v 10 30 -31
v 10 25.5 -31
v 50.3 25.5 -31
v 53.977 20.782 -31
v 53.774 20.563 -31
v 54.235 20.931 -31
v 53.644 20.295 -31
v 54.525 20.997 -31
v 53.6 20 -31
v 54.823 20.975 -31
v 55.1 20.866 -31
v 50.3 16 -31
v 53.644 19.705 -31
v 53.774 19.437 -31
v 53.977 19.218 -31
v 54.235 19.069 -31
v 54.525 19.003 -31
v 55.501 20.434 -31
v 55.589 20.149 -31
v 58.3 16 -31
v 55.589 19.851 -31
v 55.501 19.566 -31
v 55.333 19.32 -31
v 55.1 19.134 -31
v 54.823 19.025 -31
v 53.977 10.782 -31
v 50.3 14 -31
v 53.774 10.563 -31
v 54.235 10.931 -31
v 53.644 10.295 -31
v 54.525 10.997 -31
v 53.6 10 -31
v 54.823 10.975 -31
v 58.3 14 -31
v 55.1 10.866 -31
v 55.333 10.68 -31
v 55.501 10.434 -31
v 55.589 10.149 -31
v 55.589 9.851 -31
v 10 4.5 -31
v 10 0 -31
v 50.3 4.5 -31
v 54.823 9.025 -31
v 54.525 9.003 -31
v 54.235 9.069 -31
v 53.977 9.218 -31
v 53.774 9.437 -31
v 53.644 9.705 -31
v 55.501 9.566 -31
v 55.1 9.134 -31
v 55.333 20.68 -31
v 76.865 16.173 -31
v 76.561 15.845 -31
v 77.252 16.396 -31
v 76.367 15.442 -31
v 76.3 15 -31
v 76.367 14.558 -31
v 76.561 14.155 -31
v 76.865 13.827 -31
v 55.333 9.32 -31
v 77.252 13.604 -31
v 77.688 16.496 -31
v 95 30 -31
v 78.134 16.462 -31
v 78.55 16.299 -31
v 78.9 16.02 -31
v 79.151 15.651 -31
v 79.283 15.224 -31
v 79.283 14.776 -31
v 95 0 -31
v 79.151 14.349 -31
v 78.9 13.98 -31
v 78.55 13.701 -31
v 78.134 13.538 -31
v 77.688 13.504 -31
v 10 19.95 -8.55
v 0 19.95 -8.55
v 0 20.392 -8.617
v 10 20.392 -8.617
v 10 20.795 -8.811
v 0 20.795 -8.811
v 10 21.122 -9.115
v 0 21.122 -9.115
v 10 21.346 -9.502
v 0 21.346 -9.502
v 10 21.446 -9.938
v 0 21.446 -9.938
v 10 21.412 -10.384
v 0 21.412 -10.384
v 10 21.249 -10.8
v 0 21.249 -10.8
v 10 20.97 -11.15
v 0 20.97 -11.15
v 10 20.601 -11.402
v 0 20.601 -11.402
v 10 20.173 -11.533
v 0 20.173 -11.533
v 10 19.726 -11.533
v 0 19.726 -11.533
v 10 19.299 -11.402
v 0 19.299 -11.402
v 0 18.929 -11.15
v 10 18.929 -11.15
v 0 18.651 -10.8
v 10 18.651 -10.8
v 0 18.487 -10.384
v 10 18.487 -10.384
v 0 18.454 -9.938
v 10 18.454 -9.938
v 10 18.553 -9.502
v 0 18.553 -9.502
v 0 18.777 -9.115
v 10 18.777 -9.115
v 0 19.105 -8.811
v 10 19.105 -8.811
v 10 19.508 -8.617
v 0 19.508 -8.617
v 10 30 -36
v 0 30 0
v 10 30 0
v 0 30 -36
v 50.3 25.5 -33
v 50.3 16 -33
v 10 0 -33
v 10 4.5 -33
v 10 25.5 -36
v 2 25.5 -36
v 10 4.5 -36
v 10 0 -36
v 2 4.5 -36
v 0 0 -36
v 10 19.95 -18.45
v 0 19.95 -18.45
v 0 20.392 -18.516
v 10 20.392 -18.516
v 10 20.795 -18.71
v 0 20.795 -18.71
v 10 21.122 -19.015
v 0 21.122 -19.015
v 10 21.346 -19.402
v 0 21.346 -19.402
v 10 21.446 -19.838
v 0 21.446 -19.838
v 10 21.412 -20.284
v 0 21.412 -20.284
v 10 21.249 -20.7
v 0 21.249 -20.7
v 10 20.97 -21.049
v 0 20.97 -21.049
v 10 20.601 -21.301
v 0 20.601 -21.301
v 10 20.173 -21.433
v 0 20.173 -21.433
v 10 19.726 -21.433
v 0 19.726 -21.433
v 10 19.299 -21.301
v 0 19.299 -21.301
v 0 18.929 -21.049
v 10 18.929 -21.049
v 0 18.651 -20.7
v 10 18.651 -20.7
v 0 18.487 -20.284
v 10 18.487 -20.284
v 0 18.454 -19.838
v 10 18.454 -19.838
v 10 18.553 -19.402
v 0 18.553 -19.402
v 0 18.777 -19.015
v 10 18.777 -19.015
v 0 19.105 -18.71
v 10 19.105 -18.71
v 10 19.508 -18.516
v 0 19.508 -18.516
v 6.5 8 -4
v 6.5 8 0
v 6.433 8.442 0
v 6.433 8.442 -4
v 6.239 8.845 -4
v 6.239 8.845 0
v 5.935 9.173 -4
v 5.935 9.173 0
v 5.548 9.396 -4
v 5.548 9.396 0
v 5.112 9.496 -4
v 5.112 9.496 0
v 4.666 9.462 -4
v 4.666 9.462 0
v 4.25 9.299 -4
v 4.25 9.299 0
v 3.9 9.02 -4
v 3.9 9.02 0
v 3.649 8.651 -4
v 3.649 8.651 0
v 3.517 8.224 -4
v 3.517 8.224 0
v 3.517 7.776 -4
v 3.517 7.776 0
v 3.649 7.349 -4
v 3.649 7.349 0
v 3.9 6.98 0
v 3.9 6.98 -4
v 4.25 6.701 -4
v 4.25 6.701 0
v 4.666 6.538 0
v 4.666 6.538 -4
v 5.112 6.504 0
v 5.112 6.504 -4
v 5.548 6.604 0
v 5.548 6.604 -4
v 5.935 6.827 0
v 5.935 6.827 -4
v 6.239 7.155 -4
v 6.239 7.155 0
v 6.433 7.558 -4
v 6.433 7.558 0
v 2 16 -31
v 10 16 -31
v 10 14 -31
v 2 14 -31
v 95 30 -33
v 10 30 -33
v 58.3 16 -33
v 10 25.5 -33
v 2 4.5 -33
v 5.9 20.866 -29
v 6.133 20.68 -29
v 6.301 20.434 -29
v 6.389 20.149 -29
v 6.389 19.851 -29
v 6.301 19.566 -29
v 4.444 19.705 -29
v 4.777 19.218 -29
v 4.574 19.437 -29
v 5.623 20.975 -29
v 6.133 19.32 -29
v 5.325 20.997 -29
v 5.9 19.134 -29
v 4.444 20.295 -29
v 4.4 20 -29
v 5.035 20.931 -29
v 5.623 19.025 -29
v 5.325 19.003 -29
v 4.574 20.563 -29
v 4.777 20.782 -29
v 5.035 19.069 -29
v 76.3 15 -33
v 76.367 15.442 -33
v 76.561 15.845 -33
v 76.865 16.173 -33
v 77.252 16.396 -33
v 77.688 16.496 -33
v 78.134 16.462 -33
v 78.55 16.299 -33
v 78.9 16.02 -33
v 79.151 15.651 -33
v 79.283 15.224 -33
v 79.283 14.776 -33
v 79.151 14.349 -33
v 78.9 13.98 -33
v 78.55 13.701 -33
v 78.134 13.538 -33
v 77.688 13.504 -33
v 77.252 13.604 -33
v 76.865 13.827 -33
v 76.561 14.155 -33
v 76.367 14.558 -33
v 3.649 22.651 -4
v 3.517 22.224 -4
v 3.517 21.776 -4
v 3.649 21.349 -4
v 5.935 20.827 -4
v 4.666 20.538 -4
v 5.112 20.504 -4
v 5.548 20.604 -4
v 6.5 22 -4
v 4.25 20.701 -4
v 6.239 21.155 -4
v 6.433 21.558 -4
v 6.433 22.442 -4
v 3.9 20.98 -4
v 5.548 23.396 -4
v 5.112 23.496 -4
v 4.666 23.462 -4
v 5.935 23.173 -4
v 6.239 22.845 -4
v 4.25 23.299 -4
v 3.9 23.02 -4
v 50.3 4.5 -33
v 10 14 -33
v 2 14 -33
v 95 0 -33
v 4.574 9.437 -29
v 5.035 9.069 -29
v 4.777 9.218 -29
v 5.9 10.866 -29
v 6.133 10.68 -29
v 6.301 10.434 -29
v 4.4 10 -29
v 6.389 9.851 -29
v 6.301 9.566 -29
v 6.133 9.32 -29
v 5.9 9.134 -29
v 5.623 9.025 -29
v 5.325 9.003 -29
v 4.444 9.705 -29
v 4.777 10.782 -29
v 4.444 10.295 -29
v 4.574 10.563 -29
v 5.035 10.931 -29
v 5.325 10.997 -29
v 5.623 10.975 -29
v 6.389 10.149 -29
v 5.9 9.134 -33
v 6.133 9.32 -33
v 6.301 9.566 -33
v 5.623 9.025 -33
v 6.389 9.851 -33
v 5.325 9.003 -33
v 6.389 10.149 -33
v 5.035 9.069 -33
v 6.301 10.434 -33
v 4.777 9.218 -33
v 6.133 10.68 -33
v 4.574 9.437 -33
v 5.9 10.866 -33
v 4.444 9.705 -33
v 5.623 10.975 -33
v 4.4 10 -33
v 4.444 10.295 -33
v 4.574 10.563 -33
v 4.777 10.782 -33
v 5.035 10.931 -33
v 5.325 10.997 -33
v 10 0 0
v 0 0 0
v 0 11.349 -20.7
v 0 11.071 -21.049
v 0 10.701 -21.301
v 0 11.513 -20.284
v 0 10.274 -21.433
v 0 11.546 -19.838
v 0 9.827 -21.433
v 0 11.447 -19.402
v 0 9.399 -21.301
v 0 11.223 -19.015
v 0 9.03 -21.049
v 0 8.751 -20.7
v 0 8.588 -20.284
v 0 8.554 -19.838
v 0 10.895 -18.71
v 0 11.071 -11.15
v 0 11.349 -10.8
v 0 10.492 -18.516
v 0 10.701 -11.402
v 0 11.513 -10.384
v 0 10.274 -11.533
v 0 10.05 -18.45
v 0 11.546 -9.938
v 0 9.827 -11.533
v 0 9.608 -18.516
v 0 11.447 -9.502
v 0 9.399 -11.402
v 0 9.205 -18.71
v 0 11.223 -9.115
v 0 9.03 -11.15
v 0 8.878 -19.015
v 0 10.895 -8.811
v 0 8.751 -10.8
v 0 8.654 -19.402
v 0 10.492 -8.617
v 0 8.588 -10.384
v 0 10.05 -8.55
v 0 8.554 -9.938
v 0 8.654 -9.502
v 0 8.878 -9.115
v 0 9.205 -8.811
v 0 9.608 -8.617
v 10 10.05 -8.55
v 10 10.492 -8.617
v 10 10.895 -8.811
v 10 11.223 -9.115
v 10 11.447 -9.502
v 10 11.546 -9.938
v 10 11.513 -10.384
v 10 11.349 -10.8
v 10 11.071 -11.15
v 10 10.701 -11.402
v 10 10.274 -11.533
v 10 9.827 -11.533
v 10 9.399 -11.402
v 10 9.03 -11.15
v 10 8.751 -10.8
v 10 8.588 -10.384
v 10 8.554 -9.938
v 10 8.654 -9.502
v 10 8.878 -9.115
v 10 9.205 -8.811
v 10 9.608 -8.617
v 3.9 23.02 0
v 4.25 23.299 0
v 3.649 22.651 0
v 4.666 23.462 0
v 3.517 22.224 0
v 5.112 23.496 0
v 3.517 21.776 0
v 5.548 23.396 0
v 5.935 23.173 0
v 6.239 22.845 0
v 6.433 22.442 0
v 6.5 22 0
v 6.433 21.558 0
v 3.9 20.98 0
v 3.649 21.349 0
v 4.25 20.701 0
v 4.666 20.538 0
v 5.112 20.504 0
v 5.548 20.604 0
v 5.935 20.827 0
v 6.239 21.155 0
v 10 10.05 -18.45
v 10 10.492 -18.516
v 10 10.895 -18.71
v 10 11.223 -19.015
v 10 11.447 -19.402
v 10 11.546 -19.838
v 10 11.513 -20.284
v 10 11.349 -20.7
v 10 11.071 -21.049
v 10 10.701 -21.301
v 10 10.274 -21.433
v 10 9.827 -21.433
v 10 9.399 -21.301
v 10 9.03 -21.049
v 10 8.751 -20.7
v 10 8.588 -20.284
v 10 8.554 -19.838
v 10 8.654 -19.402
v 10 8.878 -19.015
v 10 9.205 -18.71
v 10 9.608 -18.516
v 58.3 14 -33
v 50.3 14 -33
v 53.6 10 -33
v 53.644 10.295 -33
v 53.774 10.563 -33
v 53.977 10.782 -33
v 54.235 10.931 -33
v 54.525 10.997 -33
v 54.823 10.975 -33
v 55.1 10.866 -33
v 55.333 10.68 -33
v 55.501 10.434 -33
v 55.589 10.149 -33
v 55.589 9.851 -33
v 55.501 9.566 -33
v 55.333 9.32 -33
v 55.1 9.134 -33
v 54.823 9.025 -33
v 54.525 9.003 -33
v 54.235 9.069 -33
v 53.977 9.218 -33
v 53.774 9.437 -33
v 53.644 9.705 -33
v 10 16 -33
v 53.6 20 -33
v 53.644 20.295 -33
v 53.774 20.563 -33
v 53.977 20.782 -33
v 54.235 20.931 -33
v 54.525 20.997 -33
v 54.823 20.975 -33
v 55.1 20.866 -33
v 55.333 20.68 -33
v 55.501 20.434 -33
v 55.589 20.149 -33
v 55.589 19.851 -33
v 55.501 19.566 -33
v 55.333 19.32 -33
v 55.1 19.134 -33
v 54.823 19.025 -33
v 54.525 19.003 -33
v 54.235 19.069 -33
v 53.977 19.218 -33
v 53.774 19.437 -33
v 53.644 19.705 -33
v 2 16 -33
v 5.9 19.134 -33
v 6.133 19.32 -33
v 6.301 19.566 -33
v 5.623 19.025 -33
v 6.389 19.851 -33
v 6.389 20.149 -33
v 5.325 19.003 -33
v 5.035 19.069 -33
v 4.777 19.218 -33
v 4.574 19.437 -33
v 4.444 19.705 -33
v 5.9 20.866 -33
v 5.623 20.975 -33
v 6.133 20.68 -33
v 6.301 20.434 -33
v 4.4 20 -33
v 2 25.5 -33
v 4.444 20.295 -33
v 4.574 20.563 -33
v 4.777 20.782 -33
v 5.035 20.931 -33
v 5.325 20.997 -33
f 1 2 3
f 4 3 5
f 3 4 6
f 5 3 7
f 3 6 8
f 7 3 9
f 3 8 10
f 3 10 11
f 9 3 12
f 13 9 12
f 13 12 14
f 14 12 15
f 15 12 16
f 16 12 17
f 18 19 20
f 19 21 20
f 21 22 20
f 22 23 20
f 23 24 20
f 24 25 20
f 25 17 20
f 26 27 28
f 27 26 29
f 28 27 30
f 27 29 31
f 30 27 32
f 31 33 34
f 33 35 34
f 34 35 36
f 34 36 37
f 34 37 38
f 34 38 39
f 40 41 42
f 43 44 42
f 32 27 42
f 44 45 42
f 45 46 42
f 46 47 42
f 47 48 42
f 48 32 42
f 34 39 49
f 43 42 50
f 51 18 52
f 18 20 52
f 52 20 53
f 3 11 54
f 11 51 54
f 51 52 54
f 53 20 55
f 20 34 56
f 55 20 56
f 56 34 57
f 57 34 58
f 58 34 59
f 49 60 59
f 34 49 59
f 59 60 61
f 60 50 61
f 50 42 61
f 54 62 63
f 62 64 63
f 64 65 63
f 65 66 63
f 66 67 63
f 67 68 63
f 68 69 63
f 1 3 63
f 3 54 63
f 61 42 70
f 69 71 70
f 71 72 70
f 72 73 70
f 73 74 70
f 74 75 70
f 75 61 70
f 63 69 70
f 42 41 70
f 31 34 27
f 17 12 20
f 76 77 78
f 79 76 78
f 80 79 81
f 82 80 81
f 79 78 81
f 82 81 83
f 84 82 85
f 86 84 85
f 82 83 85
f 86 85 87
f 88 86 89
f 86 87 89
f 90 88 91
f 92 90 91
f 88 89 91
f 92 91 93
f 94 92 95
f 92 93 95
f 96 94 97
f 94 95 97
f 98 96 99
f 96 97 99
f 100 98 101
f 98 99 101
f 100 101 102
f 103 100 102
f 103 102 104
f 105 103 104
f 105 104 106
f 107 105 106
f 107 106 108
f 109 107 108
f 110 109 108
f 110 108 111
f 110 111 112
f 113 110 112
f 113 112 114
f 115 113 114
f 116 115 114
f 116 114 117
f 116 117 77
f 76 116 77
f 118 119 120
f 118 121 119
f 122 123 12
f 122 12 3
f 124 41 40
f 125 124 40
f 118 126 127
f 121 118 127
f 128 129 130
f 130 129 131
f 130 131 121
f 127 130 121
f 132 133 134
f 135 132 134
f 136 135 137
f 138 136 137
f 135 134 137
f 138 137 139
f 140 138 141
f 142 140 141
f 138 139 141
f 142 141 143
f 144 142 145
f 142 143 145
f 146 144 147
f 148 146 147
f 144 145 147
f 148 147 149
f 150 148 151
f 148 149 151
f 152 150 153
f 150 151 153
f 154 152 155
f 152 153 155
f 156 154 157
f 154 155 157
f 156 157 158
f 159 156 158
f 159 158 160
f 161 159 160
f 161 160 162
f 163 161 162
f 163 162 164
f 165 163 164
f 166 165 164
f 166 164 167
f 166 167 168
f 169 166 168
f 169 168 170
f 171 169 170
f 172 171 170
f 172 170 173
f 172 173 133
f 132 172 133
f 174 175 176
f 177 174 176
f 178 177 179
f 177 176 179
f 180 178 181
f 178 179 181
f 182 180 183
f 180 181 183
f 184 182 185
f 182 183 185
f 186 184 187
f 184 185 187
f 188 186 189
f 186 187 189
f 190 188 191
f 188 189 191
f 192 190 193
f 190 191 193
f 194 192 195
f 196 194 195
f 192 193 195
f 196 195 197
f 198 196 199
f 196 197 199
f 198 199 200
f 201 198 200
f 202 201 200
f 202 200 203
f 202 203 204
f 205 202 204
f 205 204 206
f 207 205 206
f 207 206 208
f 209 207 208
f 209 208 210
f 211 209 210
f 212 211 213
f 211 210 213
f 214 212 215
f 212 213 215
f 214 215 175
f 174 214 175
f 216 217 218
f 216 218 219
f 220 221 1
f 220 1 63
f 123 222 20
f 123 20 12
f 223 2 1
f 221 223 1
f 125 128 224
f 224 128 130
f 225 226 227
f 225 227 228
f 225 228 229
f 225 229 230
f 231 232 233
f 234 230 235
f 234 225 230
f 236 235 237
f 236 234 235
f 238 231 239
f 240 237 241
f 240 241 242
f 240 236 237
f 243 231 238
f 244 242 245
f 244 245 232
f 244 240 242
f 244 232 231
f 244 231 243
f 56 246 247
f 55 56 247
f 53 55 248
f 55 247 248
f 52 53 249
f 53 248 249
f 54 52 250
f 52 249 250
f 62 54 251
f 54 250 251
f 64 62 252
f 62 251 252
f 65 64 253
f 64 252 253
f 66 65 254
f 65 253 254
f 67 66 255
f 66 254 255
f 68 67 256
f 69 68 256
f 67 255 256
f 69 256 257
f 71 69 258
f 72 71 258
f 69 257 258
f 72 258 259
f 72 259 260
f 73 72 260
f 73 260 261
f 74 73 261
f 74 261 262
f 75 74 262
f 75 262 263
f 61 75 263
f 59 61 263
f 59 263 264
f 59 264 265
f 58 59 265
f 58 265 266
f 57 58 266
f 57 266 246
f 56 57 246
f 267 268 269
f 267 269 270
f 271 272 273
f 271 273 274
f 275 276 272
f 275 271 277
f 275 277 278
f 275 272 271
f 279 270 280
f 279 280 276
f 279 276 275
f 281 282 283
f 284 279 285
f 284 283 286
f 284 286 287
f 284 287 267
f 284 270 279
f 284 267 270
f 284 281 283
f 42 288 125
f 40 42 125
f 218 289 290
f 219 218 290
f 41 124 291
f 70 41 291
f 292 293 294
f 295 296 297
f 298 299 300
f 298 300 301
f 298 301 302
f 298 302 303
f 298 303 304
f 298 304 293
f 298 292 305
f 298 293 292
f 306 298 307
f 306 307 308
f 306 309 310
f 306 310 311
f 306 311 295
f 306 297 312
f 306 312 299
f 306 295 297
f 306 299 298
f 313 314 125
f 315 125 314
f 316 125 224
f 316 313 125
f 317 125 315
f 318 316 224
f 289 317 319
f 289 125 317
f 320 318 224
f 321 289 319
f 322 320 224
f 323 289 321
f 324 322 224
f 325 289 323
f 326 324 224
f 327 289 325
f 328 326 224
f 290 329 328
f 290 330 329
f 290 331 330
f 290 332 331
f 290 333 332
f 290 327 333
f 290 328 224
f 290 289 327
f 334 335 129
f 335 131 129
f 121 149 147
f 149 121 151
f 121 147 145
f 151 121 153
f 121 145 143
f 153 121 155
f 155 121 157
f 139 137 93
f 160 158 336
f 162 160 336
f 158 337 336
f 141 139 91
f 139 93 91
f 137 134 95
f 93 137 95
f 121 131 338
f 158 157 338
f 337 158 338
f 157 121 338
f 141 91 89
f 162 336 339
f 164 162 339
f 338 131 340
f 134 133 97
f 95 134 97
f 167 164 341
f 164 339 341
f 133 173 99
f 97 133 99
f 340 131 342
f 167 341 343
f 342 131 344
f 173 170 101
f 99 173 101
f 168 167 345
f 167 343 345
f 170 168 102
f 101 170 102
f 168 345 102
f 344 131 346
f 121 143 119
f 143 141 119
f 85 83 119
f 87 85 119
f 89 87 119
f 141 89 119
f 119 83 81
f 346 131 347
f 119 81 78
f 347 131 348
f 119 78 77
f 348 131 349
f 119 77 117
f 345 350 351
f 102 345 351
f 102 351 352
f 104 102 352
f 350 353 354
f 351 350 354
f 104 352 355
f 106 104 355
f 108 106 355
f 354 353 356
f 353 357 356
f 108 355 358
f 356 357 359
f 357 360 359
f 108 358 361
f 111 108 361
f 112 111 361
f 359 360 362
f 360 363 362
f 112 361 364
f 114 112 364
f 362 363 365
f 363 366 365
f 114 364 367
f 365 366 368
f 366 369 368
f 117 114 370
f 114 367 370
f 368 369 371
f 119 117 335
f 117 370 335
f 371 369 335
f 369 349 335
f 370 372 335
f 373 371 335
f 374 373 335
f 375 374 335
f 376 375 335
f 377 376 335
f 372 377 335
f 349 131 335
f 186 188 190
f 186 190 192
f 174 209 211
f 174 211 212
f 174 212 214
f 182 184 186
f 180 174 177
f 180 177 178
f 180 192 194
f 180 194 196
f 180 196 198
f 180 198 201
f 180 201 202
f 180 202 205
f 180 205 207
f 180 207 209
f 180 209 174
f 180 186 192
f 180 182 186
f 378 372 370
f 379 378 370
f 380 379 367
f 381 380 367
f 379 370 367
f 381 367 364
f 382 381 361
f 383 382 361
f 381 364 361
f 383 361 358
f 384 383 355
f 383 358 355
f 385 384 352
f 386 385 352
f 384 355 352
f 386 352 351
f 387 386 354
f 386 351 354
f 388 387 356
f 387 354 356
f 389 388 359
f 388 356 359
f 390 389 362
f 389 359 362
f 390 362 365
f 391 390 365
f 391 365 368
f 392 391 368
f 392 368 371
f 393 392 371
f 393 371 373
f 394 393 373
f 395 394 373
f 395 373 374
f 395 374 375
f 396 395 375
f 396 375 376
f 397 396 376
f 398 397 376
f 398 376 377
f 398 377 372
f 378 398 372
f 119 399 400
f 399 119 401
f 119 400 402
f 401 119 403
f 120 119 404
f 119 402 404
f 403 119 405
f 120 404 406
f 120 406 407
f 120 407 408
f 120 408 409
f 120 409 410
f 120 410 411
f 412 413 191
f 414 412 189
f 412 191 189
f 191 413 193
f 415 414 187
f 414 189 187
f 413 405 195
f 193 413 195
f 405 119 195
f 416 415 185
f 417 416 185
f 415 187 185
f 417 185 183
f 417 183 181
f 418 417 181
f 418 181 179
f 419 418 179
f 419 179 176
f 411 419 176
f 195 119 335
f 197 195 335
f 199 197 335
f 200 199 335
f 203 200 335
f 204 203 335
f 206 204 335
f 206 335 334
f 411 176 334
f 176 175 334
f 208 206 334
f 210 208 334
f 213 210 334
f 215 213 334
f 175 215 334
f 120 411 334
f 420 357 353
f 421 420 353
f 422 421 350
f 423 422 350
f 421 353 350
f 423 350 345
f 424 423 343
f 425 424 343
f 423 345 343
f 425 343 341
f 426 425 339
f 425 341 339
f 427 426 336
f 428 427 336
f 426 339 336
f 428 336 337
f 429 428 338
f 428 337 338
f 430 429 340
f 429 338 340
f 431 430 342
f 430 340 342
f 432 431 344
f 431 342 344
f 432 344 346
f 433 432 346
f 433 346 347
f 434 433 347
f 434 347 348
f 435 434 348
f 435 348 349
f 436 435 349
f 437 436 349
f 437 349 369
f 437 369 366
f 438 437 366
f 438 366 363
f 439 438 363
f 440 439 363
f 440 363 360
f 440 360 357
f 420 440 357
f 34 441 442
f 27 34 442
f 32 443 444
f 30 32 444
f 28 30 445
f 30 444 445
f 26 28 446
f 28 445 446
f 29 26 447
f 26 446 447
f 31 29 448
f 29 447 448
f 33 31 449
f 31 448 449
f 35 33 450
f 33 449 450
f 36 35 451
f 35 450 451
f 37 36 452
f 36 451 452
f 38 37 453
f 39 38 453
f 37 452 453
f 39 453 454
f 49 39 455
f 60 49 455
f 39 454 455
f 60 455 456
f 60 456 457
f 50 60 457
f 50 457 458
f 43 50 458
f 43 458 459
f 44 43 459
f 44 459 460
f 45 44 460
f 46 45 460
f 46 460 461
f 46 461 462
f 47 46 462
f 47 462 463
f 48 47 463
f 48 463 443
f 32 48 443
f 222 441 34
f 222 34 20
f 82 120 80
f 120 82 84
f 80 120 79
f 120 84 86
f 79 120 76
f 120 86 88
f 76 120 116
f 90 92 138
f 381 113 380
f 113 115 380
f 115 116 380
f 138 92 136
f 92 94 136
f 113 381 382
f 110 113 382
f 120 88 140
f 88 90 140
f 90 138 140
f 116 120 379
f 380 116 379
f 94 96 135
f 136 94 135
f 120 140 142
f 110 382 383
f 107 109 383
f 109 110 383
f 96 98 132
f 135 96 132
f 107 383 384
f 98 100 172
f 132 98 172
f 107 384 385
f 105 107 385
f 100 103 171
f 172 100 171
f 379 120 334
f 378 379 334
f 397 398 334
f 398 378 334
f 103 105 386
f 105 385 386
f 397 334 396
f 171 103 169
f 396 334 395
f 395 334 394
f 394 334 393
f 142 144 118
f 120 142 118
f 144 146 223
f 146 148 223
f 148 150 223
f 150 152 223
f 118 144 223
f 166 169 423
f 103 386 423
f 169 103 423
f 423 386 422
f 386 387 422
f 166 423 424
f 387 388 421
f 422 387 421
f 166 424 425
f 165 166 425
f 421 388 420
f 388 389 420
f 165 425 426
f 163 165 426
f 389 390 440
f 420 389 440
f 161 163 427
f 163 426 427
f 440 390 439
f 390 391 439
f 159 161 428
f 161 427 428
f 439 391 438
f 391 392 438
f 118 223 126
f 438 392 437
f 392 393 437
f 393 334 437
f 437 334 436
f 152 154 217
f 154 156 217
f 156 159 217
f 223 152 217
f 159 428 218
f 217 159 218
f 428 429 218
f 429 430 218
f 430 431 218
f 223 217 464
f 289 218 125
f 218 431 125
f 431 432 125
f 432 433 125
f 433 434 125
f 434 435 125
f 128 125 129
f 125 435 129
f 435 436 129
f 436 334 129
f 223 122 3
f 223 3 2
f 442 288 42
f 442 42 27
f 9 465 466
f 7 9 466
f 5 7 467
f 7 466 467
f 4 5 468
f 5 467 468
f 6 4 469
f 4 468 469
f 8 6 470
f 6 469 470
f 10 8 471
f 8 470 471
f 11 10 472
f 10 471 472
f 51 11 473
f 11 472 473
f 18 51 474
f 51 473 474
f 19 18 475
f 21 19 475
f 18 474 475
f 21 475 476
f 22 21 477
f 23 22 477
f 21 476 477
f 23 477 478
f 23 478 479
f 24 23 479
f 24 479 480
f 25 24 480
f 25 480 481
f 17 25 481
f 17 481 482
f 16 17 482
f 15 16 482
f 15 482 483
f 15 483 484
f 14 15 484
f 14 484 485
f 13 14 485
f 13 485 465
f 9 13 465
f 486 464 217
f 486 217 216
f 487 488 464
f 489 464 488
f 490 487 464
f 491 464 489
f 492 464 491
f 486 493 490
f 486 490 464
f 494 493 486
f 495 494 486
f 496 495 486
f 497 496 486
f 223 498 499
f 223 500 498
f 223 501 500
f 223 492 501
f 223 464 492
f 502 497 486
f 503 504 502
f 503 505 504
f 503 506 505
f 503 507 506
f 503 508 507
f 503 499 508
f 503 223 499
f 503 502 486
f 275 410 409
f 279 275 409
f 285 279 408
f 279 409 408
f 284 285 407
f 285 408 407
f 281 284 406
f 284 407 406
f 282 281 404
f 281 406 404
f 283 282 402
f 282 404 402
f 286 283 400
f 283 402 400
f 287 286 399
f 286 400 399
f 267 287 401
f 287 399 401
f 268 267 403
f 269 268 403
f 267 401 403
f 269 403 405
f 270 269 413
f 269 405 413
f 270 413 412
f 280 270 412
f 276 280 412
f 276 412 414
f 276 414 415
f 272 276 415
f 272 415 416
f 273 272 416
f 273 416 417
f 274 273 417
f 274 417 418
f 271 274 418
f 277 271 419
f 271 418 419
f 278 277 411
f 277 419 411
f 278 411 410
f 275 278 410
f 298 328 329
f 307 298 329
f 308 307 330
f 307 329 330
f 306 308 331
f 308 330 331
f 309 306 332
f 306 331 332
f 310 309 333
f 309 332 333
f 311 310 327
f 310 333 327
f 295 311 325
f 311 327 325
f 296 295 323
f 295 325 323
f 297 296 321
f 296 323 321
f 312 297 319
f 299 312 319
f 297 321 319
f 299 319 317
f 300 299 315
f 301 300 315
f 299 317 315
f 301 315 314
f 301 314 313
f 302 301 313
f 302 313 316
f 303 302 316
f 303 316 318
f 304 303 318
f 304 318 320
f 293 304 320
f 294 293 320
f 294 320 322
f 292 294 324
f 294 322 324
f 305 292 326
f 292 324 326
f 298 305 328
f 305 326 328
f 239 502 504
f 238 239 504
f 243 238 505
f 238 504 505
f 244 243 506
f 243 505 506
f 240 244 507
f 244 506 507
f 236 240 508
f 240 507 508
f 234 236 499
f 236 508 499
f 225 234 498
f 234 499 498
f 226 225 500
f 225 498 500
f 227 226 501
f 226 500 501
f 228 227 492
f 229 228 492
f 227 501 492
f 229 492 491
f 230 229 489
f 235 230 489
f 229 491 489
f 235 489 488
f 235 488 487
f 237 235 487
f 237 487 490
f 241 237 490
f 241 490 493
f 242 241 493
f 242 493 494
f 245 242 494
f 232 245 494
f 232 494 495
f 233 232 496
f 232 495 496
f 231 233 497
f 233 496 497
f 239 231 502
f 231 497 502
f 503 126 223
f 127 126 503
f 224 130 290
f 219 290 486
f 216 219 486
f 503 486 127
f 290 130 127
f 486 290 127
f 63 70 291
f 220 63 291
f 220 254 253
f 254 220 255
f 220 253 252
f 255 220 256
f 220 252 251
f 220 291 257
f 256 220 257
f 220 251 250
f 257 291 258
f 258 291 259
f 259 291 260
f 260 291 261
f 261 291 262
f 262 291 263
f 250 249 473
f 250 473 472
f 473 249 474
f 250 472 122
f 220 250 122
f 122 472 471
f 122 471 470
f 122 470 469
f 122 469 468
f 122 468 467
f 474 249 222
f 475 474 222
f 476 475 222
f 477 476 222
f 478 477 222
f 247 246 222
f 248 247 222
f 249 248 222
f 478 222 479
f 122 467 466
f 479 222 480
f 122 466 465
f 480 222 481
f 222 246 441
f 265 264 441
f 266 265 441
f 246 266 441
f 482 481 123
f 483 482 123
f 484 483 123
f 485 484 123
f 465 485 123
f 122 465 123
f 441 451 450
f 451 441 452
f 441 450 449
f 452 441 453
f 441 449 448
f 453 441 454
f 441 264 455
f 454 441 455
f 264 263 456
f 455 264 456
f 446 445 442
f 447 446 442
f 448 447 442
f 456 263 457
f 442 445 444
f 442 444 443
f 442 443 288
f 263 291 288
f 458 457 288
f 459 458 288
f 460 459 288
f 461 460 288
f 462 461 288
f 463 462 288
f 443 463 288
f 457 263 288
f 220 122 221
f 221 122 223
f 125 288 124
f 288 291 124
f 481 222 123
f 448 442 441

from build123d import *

# Parameters (mm, degrees)
EXTRUDE_1_DEPTH     = 30
SKETCH_2_R          = 1.5
CUT_EXTRUDE_1_DEPTH = 106.929221653
SKETCH_3_W          = 40.3
SKETCH_3_H          = 21
CUT_EXTRUDE_2_DEPTH = 106.929221653
SKETCH_4_W          = 8
SKETCH_4_H          = 21
CUT_EXTRUDE_3_DEPTH = 3
SKETCH_5_W          = 56.3
SKETCH_5_H          = 2
CUT_EXTRUDE_4_DEPTH = 5
SKETCH_6_R          = 1
CUT_EXTRUDE_5_DEPTH = 4
SKETCH_7_R          = 1.5
CUT_EXTRUDE_6_DEPTH = 106.929221653
SKETCH_8_R          = 1.5
CUT_EXTRUDE_7_DEPTH = 4


with BuildPart() as part:
    # Эскиз1 → Бобышка-Вытянуть1 (new body)
    with BuildSketch(Plane(origin=(0, 0, 0), x_dir=(1, 0, 0), z_dir=(0, 1, 0))):
        Polygon((0, 0), (10, 0), (10, 31), (95, 31), (95, 33), (10, 33), (10, 36), (0, 36), align=None)
    extrude(amount=EXTRUDE_1_DEPTH)

    # Эскиз2 → Вырез-Вытянуть1 (cut, through all)
    with BuildSketch(Plane.ZY):
        with Locations((-19.949747468, 19.949747468)):
            Circle(SKETCH_2_R)
        with Locations((-10.050252532, 19.949747468)):
            Circle(SKETCH_2_R)
        with Locations((-19.949747468, 10.050252532)):
            Circle(SKETCH_2_R)
        with Locations((-10.050252532, 10.050252532)):
            Circle(SKETCH_2_R)
    extrude(amount=-CUT_EXTRUDE_1_DEPTH, mode=Mode.SUBTRACT)

    # Эскиз3 → Вырез-Вытянуть2 (cut, through all)
    with BuildSketch(Plane(origin=(0, 0, -36), x_dir=(-1, 0, 0), z_dir=(0, 0, -1))):
        with Locations((-30.15, 15)):
            Rectangle(SKETCH_3_W, SKETCH_3_H)
    extrude(amount=-CUT_EXTRUDE_2_DEPTH, mode=Mode.SUBTRACT)

    # Эскиз4 → Вырез-Вытянуть3 (cut)
    with BuildSketch(Plane(origin=(0, 0, -36), x_dir=(-1, 0, 0), z_dir=(0, 0, -1))):
        with Locations((-6, 15)):
            Rectangle(SKETCH_4_W, SKETCH_4_H)
    extrude(amount=-CUT_EXTRUDE_3_DEPTH, mode=Mode.SUBTRACT)

    # Эскиз5 → Вырез-Вытянуть4 (cut)
    with BuildSketch(Plane(origin=(0, 0, -36), x_dir=(-1, 0, 0), z_dir=(0, 0, -1))):
        with Locations((-30.15, 15)):
            Rectangle(SKETCH_5_W, SKETCH_5_H)
    extrude(amount=-CUT_EXTRUDE_4_DEPTH, mode=Mode.SUBTRACT)

    # Эскиз6 → Вырез-Вытянуть5 (cut)
    with BuildSketch(Plane(origin=(0, 0, -33), x_dir=(-1, 0, 0), z_dir=(0, 0, -1))):
        with Locations((-5.4, 10)):
            Circle(SKETCH_6_R)
        with Locations((-54.6, 10)):
            Circle(SKETCH_6_R)
        with Locations((-5.4, 20)):
            Circle(SKETCH_6_R)
        with Locations((-54.6, 20)):
            Circle(SKETCH_6_R)
    extrude(amount=-CUT_EXTRUDE_5_DEPTH, mode=Mode.SUBTRACT)

    # Эскиз7 → Вырез-Вытянуть6 (cut, through all)
    with BuildSketch(Plane(origin=(0, 0, -36), x_dir=(-1, 0, 0), z_dir=(0, 0, -1))):
        with Locations((-77.8, 15)):
            Circle(SKETCH_7_R)
    extrude(amount=-CUT_EXTRUDE_6_DEPTH, mode=Mode.SUBTRACT)

    # Эскиз8 → Вырез-Вытянуть7 (cut)
    with BuildSketch(Plane.XY):
        with Locations((5, 22)):
            Circle(SKETCH_8_R)
        with Locations((5, 8)):
            Circle(SKETCH_8_R)
    extrude(amount=-CUT_EXTRUDE_7_DEPTH, mode=Mode.SUBTRACT)


with BuildPart() as body_2:
    # Split Bodies 1: the piece on the far side of the plane
    add(part.part)
    split(bisect_by=Plane(origin=(10, 30, 0), x_dir=(0, 0, -1), z_dir=(-1, 0, 0)), keep=Keep.BOTTOM)


with BuildPart() as part_1:
    add(part.part)

    # Split Bodies 1
    split(bisect_by=Plane(origin=(10, 30, 0), x_dir=(0, 0, -1), z_dir=(-1, 0, 0)), keep=Keep.TOP)


solid = Compound([body_2.part, part_1.part])
